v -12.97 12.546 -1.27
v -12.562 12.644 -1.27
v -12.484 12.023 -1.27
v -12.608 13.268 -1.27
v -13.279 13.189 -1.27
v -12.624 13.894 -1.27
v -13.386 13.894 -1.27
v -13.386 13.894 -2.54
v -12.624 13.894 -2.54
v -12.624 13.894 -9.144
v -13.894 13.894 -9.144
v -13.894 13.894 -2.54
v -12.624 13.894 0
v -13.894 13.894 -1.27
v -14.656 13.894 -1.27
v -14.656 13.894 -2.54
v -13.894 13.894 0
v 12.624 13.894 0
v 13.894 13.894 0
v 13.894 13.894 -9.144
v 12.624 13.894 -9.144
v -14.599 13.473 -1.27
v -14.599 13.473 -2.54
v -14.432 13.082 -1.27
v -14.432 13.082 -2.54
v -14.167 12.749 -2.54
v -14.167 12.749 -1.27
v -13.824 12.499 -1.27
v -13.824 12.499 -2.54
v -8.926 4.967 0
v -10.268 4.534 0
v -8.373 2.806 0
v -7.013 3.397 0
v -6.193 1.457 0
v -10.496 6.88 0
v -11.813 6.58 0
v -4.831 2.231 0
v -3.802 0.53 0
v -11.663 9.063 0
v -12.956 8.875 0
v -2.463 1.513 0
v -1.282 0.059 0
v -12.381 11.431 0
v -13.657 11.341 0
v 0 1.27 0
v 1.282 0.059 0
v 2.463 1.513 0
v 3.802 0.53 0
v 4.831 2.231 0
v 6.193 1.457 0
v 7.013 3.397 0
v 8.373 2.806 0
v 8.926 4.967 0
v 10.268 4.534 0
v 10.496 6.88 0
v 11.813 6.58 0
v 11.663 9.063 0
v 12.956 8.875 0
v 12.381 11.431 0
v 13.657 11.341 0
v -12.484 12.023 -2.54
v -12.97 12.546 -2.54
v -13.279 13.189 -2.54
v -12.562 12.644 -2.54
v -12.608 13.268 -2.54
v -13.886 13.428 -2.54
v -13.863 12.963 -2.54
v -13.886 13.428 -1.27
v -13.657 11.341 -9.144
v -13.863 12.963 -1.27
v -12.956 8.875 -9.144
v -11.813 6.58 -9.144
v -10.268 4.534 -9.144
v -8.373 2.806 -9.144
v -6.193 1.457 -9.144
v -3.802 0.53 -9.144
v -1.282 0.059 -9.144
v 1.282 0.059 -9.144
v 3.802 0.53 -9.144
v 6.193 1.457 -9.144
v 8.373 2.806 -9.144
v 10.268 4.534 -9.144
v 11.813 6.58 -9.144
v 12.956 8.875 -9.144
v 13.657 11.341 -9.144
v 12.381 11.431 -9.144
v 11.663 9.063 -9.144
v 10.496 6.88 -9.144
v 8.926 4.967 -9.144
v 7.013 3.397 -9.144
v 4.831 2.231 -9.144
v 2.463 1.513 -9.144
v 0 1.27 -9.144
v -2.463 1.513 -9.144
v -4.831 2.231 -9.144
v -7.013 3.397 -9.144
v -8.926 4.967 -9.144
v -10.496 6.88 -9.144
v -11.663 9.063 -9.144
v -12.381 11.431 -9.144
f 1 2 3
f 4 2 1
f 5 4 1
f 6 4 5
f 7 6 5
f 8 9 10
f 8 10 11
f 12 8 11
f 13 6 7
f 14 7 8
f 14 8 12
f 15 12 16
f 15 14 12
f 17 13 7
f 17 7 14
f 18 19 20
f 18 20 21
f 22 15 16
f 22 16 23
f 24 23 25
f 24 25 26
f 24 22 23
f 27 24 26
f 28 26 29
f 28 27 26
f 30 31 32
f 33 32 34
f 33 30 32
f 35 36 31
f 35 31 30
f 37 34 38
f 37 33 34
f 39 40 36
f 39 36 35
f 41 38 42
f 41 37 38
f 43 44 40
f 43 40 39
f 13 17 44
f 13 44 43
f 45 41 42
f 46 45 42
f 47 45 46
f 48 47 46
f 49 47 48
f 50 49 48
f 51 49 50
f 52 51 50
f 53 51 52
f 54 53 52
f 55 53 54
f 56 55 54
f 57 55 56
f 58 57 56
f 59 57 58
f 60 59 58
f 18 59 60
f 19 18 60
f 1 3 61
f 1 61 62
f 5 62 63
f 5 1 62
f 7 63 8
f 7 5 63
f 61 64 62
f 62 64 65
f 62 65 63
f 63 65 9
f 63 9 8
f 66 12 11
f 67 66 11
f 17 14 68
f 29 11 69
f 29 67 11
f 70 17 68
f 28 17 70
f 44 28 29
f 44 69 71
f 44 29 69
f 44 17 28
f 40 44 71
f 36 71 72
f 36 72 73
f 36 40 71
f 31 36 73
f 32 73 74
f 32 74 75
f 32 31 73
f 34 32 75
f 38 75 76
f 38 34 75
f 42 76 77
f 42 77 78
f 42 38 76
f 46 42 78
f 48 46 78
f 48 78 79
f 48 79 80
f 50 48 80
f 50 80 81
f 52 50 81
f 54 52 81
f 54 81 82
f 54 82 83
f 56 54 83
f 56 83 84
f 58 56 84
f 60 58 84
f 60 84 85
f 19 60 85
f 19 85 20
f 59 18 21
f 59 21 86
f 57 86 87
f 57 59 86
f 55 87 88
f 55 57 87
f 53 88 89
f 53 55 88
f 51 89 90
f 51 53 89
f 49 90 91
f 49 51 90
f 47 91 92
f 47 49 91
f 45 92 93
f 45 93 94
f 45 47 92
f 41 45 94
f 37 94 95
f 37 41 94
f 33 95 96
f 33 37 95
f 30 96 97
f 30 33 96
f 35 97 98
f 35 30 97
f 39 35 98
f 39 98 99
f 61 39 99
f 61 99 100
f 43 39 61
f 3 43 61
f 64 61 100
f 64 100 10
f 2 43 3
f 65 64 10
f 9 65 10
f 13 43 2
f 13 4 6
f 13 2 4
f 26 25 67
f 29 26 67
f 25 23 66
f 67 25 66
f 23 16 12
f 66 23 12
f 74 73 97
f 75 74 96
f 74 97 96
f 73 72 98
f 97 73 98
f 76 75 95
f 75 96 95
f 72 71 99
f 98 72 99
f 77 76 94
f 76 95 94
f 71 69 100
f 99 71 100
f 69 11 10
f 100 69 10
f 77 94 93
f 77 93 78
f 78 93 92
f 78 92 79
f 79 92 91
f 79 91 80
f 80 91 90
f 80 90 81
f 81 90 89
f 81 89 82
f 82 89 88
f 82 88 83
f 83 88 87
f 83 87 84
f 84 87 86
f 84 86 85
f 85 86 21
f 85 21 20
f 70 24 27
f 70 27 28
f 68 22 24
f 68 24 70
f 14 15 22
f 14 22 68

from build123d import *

# Parameters (mm, degrees)
BOSS_EXTRUDE1_DEPTH = 9.144
BOSS_EXTRUDE2_DEPTH = 1.27
CUT_EXTRUDE2_DEPTH  = 1.27


with BuildPart() as part:
    # Sketch1 → Boss-Extrude1 (new body)
    with BuildSketch(Plane.XY):
        with BuildLine():
            Line((13.8938, 13.8938), (12.6238, 13.8938))
            ThreePointArc((12.6238, 13.8938), (0, 1.27), (-12.6238, 13.8938))
            Line((-12.6238, 13.8938), (-13.8938, 13.8938))
            ThreePointArc((-13.8938, 13.8938), (0, 0), (13.8938, 13.8938))
        make_face()
    extrude(amount=-BOSS_EXTRUDE1_DEPTH)

    # Sketch3 → Boss-Extrude2 (add)
    with BuildSketch(Plane.XY.offset(-1.27)):
        with BuildLine():
            Line((-13.8938, 13.8938), (-14.6558, 13.8938))
            ThreePointArc((-14.6558, 13.8938), (-14.431944467, 13.081702502), (-13.82361054, 12.498998908))
            ThreePointArc((-13.82361054, 12.498998908), (-13.87624154, 13.19551699), (-13.8938, 13.8938))
        make_face()
    extrude(amount=-BOSS_EXTRUDE2_DEPTH)

    # Sketch4 → Cut-Extrude2 (cut)
    with BuildSketch(Plane.XY.offset(-1.27)):
        with BuildLine():
            Line((-13.3858, 13.8938), (-12.6238, 13.8938))
            ThreePointArc((-12.6238, 13.8938), (-12.588918043, 12.955999941), (-12.484464942, 12.023382522))
            ThreePointArc((-12.484464942, 12.023382522), (-13.148713609, 12.855668695), (-13.3858, 13.8938))
        make_face()
    extrude(amount=-CUT_EXTRUDE2_DEPTH, mode=Mode.SUBTRACT)


solid = part.part
